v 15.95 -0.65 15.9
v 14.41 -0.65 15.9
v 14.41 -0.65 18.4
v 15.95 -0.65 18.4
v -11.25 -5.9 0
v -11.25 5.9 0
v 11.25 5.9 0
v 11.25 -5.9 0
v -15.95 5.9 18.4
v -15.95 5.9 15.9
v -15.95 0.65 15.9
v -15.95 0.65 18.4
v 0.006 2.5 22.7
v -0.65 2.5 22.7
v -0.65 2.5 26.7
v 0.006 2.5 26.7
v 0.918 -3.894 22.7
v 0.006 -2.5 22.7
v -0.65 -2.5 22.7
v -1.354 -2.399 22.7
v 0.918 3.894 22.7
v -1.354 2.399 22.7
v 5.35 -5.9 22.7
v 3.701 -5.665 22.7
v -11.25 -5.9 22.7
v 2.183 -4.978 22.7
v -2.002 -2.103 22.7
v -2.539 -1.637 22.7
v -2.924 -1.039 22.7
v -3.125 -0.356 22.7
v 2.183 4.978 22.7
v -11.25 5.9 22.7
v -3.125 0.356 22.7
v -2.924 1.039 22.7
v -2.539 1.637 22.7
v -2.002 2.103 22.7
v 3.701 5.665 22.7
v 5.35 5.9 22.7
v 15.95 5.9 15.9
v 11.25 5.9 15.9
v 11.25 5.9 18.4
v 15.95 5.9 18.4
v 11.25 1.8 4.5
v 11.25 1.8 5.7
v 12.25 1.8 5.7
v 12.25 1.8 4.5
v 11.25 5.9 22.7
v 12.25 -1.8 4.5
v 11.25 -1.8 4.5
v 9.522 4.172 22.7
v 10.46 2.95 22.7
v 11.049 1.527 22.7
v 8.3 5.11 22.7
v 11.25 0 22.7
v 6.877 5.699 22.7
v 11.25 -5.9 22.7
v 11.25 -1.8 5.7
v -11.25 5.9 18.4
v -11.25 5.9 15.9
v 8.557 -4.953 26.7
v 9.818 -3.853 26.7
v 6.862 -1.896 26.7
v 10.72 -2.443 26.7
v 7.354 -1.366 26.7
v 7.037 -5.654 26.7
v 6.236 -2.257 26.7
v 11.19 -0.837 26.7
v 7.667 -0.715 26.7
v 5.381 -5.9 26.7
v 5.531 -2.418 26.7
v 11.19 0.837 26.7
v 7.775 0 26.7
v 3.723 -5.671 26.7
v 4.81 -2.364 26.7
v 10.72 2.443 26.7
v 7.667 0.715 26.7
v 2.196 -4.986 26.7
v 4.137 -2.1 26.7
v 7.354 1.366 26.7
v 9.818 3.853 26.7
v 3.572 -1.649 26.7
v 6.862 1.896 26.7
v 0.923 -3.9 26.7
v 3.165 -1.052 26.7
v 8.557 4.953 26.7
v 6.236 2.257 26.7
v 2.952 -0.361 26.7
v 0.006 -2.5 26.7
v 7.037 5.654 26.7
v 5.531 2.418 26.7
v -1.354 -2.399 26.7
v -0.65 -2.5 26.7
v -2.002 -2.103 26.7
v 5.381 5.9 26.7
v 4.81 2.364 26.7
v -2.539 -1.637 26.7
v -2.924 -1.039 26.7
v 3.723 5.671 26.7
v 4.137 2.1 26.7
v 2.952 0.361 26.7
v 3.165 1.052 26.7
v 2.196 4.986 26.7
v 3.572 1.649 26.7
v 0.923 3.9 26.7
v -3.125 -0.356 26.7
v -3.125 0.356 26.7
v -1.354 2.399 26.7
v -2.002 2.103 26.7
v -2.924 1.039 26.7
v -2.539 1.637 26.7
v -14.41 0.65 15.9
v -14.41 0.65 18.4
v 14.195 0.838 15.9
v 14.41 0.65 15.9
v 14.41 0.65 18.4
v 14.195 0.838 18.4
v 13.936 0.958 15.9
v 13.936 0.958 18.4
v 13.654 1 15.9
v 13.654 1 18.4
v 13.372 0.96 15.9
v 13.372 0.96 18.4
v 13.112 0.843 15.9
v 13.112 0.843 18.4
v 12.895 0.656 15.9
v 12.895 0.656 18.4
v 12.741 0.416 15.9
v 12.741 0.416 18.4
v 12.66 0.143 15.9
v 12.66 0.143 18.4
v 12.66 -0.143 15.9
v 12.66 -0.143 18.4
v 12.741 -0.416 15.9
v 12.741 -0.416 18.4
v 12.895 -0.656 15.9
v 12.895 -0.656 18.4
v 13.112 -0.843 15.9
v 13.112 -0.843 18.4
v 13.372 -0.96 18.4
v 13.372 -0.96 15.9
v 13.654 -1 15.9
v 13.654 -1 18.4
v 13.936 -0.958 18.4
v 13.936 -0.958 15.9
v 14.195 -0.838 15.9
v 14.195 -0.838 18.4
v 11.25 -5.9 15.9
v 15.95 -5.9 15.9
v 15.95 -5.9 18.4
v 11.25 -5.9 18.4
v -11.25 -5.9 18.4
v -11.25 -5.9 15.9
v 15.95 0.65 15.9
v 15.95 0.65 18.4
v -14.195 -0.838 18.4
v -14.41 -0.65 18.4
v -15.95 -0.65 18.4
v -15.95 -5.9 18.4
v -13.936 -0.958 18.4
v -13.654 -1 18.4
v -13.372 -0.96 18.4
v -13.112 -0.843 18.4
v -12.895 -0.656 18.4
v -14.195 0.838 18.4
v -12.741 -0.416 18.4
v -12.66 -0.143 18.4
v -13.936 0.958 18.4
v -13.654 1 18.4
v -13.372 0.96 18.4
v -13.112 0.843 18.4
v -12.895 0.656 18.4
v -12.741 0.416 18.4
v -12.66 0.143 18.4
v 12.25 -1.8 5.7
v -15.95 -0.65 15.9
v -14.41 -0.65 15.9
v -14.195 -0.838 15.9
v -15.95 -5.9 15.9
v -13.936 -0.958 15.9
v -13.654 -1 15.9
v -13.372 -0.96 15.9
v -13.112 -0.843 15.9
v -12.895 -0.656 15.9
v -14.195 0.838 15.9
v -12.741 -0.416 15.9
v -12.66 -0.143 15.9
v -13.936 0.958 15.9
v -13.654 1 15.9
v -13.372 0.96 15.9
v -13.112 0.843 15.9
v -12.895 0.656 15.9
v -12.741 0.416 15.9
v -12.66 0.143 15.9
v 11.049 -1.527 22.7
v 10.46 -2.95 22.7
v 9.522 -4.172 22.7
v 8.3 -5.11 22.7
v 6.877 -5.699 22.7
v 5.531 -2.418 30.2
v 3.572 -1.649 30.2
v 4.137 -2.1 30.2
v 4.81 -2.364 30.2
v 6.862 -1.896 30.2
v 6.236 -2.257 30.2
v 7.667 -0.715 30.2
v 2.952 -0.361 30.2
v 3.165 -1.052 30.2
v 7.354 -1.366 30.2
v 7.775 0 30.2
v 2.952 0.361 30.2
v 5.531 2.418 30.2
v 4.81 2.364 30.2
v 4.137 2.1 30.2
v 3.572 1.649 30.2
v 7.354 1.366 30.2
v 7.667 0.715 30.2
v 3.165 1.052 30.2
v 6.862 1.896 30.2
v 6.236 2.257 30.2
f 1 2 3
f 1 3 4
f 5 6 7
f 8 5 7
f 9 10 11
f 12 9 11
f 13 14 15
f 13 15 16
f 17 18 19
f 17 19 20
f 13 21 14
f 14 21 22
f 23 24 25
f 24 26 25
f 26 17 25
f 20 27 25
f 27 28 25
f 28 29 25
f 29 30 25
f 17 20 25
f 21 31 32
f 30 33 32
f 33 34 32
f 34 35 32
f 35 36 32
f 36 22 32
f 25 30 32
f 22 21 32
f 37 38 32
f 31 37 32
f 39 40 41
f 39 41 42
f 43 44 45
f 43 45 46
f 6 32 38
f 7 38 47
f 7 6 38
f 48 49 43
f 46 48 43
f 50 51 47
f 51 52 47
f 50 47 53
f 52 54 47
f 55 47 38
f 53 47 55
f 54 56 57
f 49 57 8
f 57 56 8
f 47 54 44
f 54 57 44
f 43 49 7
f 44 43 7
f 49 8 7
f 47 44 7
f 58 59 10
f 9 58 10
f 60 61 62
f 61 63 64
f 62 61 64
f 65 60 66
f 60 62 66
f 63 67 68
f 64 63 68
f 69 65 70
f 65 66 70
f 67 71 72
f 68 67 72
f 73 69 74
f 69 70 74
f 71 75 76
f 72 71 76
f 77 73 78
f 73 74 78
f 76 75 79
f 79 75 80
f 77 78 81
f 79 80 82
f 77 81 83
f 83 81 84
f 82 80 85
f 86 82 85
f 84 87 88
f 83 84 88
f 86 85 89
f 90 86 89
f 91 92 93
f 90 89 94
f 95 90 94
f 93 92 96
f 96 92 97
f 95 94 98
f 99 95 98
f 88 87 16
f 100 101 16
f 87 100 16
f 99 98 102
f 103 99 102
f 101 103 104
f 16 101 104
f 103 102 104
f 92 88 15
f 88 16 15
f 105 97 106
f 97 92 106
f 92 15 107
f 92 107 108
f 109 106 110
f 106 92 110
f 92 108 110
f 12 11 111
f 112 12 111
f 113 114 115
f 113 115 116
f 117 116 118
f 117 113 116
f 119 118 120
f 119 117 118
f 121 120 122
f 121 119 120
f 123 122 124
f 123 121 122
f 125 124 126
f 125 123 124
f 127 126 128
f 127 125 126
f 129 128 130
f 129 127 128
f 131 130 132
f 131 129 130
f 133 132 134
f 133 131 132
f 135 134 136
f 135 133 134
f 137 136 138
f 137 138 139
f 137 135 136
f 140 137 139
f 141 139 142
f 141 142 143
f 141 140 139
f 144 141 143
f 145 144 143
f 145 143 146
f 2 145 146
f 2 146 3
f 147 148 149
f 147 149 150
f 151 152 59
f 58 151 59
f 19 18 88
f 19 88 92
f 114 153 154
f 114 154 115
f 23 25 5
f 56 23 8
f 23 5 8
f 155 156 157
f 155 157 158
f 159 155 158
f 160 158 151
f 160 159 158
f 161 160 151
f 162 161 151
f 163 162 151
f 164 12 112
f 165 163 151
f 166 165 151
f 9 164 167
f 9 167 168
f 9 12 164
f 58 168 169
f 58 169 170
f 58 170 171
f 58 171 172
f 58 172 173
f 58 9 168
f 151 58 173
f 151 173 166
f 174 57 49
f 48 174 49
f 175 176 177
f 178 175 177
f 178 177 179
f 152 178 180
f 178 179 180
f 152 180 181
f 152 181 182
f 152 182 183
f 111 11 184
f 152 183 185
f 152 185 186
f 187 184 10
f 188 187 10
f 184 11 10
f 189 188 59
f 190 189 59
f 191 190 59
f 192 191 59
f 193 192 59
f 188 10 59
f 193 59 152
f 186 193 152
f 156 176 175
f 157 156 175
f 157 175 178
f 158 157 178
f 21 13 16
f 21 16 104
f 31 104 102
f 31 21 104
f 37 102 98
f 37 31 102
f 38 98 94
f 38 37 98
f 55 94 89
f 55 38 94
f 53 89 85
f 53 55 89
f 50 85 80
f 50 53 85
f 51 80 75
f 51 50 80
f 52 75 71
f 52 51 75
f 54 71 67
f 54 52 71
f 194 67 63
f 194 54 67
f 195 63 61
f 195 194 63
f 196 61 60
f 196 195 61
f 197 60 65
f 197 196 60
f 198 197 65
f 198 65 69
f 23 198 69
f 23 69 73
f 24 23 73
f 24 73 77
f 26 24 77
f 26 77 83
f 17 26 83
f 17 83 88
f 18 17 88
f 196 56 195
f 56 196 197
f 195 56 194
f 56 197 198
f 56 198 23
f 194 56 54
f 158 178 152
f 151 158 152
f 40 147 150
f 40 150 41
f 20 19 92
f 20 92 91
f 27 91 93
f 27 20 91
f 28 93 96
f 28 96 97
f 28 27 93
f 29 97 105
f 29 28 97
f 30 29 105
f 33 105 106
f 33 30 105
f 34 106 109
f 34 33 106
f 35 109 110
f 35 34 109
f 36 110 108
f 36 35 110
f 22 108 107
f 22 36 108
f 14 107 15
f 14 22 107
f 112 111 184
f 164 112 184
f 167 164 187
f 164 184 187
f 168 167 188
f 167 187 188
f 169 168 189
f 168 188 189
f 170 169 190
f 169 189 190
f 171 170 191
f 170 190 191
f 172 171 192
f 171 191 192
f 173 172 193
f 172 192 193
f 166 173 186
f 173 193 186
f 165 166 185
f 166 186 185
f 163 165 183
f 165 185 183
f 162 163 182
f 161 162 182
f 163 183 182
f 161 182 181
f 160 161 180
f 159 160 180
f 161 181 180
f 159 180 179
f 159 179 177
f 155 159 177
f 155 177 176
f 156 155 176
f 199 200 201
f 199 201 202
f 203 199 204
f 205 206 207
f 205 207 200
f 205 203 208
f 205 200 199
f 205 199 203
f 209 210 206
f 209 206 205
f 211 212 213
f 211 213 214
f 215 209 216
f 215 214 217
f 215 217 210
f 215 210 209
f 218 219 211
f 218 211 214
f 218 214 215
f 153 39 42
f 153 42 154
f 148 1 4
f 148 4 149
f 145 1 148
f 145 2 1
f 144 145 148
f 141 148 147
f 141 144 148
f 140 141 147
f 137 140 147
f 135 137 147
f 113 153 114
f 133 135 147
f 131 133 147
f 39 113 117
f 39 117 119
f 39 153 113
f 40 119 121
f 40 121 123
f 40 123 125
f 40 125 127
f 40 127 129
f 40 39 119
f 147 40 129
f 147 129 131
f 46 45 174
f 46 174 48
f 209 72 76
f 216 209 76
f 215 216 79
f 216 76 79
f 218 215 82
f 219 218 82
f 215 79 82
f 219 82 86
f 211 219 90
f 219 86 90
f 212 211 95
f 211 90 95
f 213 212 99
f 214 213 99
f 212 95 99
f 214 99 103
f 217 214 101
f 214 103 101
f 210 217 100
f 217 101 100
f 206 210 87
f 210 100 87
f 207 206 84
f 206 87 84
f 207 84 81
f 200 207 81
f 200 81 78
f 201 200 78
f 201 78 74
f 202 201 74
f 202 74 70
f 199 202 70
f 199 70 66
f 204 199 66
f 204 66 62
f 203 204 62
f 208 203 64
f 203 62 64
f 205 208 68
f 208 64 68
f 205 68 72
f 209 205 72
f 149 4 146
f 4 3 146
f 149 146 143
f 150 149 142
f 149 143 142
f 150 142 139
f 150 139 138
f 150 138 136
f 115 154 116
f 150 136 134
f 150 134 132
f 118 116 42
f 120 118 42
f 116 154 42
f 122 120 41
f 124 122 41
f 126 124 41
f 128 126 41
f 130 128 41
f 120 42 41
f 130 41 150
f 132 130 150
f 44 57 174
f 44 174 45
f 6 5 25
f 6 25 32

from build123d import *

# Parameters (mm, degrees)
CROQUIS1_W                = 22.5
CROQUIS1_H                = 11.8
SALIENTE_EXTRUIR2_DEPTH   = 15.9
SALIENTE_EXTRUIR3_DEPTH   = 2.5
SALIENTE_EXTRUIR3_2_DEPTH = 2.5
CROQUIS3_W                = 22.5
CROQUIS3_H                = 11.8
SALIENTE_EXTRUIR4_DEPTH   = 22.7
SALIENTE_EXTRUIR5_DEPTH   = 4
CROQUIS5_R                = 2.425
SALIENTE_EXTRUIR6_DEPTH   = 3.5
CROQUIS7_W                = 1.2
CROQUIS7_H                = 3.6
SALIENTE_EXTRUIR7_DEPTH   = 1


with BuildPart() as part:
    # Croquis1 → Saliente-Extruir2 (new body)
    with BuildSketch(Plane.XY):
        Rectangle(CROQUIS1_W, CROQUIS1_H)
    extrude(amount=SALIENTE_EXTRUIR2_DEPTH)

    # Croquis3 → Saliente-Extruir4 (add)
    with BuildSketch(Plane(origin=(0, 0, 0), x_dir=(-1, 0, 0), z_dir=(0, 0, -1))):
        Rectangle(CROQUIS3_W, CROQUIS3_H)
    extrude(amount=-SALIENTE_EXTRUIR4_DEPTH)

    # Croquis4 → Saliente-Extruir5 (add)
    with BuildSketch(Plane.XY.offset(22.7)):
        with BuildLine():
            Line((-0.65, 2.5), (0.005844314, 2.5))
            ThreePointArc((0.005844314, 2.5), (11.25, 0), (0.005844314, -2.5))
            Line((0.005844314, -2.5), (-0.65, -2.5))
            ThreePointArc((-0.65, -2.5), (-3.15, 0), (-0.65, 2.5))
        make_face()
    extrude(amount=SALIENTE_EXTRUIR5_DEPTH)

    # Croquis5 → Saliente-Extruir6 (add)
    with BuildSketch(Plane.XY.offset(26.7)):
        with Locations((5.35, 0)):
            Circle(CROQUIS5_R)
    extrude(amount=SALIENTE_EXTRUIR6_DEPTH)

    # Croquis7 → Saliente-Extruir7 (add)
    with BuildSketch(Plane(origin=(11.25, 0, 0), x_dir=(0, 0, -1), z_dir=(1, 0, 0))):
        with Locations((-5.1, 0)):
            Rectangle(CROQUIS7_W, CROQUIS7_H)
    extrude(amount=SALIENTE_EXTRUIR7_DEPTH)


with BuildPart() as body_2:
    # Croquis2 → Saliente-Extruir3 (new body)
    with BuildSketch(Plane.XY.offset(15.9)):
        with BuildLine():
            Line((-11.25, 5.9), (-15.95, 5.9))
            Line((-15.95, 5.9), (-15.95, 0.65))
            Line((-15.95, 0.65), (-14.409934208, 0.65))
            ThreePointArc((-14.409934208, 0.65), (-12.65, 0), (-14.409934208, -0.65))
            Line((-14.409934208, -0.65), (-15.95, -0.65))
            Line((-15.95, -0.65), (-15.95, -5.9))
            Line((-15.95, -5.9), (-11.25, -5.9))
            Line((-11.25, -5.9), (-11.25, 5.9))
        make_face()
    extrude(amount=SALIENTE_EXTRUIR3_DEPTH)


with BuildPart() as body_3:
    # Croquis2 → Saliente-Extruir3 2 (new body)
    with BuildSketch(Plane.XY.offset(15.9)):
        with BuildLine():
            Line((15.95, -0.65), (15.95, -5.9))
            Line((15.95, -5.9), (11.25, -5.9))
            Line((11.25, -5.9), (11.25, 5.9))
            Line((11.25, 5.9), (15.95, 5.9))
            Line((15.95, 5.9), (15.95, 0.65))
            Line((15.95, 0.65), (14.409934208, 0.65))
            ThreePointArc((14.409934208, 0.65), (12.65, 0), (14.409934208, -0.65))
            Line((14.409934208, -0.65), (15.95, -0.65))
        make_face()
    extrude(amount=SALIENTE_EXTRUIR3_2_DEPTH)


solid = Compound([part.part, body_2.part, body_3.part])
